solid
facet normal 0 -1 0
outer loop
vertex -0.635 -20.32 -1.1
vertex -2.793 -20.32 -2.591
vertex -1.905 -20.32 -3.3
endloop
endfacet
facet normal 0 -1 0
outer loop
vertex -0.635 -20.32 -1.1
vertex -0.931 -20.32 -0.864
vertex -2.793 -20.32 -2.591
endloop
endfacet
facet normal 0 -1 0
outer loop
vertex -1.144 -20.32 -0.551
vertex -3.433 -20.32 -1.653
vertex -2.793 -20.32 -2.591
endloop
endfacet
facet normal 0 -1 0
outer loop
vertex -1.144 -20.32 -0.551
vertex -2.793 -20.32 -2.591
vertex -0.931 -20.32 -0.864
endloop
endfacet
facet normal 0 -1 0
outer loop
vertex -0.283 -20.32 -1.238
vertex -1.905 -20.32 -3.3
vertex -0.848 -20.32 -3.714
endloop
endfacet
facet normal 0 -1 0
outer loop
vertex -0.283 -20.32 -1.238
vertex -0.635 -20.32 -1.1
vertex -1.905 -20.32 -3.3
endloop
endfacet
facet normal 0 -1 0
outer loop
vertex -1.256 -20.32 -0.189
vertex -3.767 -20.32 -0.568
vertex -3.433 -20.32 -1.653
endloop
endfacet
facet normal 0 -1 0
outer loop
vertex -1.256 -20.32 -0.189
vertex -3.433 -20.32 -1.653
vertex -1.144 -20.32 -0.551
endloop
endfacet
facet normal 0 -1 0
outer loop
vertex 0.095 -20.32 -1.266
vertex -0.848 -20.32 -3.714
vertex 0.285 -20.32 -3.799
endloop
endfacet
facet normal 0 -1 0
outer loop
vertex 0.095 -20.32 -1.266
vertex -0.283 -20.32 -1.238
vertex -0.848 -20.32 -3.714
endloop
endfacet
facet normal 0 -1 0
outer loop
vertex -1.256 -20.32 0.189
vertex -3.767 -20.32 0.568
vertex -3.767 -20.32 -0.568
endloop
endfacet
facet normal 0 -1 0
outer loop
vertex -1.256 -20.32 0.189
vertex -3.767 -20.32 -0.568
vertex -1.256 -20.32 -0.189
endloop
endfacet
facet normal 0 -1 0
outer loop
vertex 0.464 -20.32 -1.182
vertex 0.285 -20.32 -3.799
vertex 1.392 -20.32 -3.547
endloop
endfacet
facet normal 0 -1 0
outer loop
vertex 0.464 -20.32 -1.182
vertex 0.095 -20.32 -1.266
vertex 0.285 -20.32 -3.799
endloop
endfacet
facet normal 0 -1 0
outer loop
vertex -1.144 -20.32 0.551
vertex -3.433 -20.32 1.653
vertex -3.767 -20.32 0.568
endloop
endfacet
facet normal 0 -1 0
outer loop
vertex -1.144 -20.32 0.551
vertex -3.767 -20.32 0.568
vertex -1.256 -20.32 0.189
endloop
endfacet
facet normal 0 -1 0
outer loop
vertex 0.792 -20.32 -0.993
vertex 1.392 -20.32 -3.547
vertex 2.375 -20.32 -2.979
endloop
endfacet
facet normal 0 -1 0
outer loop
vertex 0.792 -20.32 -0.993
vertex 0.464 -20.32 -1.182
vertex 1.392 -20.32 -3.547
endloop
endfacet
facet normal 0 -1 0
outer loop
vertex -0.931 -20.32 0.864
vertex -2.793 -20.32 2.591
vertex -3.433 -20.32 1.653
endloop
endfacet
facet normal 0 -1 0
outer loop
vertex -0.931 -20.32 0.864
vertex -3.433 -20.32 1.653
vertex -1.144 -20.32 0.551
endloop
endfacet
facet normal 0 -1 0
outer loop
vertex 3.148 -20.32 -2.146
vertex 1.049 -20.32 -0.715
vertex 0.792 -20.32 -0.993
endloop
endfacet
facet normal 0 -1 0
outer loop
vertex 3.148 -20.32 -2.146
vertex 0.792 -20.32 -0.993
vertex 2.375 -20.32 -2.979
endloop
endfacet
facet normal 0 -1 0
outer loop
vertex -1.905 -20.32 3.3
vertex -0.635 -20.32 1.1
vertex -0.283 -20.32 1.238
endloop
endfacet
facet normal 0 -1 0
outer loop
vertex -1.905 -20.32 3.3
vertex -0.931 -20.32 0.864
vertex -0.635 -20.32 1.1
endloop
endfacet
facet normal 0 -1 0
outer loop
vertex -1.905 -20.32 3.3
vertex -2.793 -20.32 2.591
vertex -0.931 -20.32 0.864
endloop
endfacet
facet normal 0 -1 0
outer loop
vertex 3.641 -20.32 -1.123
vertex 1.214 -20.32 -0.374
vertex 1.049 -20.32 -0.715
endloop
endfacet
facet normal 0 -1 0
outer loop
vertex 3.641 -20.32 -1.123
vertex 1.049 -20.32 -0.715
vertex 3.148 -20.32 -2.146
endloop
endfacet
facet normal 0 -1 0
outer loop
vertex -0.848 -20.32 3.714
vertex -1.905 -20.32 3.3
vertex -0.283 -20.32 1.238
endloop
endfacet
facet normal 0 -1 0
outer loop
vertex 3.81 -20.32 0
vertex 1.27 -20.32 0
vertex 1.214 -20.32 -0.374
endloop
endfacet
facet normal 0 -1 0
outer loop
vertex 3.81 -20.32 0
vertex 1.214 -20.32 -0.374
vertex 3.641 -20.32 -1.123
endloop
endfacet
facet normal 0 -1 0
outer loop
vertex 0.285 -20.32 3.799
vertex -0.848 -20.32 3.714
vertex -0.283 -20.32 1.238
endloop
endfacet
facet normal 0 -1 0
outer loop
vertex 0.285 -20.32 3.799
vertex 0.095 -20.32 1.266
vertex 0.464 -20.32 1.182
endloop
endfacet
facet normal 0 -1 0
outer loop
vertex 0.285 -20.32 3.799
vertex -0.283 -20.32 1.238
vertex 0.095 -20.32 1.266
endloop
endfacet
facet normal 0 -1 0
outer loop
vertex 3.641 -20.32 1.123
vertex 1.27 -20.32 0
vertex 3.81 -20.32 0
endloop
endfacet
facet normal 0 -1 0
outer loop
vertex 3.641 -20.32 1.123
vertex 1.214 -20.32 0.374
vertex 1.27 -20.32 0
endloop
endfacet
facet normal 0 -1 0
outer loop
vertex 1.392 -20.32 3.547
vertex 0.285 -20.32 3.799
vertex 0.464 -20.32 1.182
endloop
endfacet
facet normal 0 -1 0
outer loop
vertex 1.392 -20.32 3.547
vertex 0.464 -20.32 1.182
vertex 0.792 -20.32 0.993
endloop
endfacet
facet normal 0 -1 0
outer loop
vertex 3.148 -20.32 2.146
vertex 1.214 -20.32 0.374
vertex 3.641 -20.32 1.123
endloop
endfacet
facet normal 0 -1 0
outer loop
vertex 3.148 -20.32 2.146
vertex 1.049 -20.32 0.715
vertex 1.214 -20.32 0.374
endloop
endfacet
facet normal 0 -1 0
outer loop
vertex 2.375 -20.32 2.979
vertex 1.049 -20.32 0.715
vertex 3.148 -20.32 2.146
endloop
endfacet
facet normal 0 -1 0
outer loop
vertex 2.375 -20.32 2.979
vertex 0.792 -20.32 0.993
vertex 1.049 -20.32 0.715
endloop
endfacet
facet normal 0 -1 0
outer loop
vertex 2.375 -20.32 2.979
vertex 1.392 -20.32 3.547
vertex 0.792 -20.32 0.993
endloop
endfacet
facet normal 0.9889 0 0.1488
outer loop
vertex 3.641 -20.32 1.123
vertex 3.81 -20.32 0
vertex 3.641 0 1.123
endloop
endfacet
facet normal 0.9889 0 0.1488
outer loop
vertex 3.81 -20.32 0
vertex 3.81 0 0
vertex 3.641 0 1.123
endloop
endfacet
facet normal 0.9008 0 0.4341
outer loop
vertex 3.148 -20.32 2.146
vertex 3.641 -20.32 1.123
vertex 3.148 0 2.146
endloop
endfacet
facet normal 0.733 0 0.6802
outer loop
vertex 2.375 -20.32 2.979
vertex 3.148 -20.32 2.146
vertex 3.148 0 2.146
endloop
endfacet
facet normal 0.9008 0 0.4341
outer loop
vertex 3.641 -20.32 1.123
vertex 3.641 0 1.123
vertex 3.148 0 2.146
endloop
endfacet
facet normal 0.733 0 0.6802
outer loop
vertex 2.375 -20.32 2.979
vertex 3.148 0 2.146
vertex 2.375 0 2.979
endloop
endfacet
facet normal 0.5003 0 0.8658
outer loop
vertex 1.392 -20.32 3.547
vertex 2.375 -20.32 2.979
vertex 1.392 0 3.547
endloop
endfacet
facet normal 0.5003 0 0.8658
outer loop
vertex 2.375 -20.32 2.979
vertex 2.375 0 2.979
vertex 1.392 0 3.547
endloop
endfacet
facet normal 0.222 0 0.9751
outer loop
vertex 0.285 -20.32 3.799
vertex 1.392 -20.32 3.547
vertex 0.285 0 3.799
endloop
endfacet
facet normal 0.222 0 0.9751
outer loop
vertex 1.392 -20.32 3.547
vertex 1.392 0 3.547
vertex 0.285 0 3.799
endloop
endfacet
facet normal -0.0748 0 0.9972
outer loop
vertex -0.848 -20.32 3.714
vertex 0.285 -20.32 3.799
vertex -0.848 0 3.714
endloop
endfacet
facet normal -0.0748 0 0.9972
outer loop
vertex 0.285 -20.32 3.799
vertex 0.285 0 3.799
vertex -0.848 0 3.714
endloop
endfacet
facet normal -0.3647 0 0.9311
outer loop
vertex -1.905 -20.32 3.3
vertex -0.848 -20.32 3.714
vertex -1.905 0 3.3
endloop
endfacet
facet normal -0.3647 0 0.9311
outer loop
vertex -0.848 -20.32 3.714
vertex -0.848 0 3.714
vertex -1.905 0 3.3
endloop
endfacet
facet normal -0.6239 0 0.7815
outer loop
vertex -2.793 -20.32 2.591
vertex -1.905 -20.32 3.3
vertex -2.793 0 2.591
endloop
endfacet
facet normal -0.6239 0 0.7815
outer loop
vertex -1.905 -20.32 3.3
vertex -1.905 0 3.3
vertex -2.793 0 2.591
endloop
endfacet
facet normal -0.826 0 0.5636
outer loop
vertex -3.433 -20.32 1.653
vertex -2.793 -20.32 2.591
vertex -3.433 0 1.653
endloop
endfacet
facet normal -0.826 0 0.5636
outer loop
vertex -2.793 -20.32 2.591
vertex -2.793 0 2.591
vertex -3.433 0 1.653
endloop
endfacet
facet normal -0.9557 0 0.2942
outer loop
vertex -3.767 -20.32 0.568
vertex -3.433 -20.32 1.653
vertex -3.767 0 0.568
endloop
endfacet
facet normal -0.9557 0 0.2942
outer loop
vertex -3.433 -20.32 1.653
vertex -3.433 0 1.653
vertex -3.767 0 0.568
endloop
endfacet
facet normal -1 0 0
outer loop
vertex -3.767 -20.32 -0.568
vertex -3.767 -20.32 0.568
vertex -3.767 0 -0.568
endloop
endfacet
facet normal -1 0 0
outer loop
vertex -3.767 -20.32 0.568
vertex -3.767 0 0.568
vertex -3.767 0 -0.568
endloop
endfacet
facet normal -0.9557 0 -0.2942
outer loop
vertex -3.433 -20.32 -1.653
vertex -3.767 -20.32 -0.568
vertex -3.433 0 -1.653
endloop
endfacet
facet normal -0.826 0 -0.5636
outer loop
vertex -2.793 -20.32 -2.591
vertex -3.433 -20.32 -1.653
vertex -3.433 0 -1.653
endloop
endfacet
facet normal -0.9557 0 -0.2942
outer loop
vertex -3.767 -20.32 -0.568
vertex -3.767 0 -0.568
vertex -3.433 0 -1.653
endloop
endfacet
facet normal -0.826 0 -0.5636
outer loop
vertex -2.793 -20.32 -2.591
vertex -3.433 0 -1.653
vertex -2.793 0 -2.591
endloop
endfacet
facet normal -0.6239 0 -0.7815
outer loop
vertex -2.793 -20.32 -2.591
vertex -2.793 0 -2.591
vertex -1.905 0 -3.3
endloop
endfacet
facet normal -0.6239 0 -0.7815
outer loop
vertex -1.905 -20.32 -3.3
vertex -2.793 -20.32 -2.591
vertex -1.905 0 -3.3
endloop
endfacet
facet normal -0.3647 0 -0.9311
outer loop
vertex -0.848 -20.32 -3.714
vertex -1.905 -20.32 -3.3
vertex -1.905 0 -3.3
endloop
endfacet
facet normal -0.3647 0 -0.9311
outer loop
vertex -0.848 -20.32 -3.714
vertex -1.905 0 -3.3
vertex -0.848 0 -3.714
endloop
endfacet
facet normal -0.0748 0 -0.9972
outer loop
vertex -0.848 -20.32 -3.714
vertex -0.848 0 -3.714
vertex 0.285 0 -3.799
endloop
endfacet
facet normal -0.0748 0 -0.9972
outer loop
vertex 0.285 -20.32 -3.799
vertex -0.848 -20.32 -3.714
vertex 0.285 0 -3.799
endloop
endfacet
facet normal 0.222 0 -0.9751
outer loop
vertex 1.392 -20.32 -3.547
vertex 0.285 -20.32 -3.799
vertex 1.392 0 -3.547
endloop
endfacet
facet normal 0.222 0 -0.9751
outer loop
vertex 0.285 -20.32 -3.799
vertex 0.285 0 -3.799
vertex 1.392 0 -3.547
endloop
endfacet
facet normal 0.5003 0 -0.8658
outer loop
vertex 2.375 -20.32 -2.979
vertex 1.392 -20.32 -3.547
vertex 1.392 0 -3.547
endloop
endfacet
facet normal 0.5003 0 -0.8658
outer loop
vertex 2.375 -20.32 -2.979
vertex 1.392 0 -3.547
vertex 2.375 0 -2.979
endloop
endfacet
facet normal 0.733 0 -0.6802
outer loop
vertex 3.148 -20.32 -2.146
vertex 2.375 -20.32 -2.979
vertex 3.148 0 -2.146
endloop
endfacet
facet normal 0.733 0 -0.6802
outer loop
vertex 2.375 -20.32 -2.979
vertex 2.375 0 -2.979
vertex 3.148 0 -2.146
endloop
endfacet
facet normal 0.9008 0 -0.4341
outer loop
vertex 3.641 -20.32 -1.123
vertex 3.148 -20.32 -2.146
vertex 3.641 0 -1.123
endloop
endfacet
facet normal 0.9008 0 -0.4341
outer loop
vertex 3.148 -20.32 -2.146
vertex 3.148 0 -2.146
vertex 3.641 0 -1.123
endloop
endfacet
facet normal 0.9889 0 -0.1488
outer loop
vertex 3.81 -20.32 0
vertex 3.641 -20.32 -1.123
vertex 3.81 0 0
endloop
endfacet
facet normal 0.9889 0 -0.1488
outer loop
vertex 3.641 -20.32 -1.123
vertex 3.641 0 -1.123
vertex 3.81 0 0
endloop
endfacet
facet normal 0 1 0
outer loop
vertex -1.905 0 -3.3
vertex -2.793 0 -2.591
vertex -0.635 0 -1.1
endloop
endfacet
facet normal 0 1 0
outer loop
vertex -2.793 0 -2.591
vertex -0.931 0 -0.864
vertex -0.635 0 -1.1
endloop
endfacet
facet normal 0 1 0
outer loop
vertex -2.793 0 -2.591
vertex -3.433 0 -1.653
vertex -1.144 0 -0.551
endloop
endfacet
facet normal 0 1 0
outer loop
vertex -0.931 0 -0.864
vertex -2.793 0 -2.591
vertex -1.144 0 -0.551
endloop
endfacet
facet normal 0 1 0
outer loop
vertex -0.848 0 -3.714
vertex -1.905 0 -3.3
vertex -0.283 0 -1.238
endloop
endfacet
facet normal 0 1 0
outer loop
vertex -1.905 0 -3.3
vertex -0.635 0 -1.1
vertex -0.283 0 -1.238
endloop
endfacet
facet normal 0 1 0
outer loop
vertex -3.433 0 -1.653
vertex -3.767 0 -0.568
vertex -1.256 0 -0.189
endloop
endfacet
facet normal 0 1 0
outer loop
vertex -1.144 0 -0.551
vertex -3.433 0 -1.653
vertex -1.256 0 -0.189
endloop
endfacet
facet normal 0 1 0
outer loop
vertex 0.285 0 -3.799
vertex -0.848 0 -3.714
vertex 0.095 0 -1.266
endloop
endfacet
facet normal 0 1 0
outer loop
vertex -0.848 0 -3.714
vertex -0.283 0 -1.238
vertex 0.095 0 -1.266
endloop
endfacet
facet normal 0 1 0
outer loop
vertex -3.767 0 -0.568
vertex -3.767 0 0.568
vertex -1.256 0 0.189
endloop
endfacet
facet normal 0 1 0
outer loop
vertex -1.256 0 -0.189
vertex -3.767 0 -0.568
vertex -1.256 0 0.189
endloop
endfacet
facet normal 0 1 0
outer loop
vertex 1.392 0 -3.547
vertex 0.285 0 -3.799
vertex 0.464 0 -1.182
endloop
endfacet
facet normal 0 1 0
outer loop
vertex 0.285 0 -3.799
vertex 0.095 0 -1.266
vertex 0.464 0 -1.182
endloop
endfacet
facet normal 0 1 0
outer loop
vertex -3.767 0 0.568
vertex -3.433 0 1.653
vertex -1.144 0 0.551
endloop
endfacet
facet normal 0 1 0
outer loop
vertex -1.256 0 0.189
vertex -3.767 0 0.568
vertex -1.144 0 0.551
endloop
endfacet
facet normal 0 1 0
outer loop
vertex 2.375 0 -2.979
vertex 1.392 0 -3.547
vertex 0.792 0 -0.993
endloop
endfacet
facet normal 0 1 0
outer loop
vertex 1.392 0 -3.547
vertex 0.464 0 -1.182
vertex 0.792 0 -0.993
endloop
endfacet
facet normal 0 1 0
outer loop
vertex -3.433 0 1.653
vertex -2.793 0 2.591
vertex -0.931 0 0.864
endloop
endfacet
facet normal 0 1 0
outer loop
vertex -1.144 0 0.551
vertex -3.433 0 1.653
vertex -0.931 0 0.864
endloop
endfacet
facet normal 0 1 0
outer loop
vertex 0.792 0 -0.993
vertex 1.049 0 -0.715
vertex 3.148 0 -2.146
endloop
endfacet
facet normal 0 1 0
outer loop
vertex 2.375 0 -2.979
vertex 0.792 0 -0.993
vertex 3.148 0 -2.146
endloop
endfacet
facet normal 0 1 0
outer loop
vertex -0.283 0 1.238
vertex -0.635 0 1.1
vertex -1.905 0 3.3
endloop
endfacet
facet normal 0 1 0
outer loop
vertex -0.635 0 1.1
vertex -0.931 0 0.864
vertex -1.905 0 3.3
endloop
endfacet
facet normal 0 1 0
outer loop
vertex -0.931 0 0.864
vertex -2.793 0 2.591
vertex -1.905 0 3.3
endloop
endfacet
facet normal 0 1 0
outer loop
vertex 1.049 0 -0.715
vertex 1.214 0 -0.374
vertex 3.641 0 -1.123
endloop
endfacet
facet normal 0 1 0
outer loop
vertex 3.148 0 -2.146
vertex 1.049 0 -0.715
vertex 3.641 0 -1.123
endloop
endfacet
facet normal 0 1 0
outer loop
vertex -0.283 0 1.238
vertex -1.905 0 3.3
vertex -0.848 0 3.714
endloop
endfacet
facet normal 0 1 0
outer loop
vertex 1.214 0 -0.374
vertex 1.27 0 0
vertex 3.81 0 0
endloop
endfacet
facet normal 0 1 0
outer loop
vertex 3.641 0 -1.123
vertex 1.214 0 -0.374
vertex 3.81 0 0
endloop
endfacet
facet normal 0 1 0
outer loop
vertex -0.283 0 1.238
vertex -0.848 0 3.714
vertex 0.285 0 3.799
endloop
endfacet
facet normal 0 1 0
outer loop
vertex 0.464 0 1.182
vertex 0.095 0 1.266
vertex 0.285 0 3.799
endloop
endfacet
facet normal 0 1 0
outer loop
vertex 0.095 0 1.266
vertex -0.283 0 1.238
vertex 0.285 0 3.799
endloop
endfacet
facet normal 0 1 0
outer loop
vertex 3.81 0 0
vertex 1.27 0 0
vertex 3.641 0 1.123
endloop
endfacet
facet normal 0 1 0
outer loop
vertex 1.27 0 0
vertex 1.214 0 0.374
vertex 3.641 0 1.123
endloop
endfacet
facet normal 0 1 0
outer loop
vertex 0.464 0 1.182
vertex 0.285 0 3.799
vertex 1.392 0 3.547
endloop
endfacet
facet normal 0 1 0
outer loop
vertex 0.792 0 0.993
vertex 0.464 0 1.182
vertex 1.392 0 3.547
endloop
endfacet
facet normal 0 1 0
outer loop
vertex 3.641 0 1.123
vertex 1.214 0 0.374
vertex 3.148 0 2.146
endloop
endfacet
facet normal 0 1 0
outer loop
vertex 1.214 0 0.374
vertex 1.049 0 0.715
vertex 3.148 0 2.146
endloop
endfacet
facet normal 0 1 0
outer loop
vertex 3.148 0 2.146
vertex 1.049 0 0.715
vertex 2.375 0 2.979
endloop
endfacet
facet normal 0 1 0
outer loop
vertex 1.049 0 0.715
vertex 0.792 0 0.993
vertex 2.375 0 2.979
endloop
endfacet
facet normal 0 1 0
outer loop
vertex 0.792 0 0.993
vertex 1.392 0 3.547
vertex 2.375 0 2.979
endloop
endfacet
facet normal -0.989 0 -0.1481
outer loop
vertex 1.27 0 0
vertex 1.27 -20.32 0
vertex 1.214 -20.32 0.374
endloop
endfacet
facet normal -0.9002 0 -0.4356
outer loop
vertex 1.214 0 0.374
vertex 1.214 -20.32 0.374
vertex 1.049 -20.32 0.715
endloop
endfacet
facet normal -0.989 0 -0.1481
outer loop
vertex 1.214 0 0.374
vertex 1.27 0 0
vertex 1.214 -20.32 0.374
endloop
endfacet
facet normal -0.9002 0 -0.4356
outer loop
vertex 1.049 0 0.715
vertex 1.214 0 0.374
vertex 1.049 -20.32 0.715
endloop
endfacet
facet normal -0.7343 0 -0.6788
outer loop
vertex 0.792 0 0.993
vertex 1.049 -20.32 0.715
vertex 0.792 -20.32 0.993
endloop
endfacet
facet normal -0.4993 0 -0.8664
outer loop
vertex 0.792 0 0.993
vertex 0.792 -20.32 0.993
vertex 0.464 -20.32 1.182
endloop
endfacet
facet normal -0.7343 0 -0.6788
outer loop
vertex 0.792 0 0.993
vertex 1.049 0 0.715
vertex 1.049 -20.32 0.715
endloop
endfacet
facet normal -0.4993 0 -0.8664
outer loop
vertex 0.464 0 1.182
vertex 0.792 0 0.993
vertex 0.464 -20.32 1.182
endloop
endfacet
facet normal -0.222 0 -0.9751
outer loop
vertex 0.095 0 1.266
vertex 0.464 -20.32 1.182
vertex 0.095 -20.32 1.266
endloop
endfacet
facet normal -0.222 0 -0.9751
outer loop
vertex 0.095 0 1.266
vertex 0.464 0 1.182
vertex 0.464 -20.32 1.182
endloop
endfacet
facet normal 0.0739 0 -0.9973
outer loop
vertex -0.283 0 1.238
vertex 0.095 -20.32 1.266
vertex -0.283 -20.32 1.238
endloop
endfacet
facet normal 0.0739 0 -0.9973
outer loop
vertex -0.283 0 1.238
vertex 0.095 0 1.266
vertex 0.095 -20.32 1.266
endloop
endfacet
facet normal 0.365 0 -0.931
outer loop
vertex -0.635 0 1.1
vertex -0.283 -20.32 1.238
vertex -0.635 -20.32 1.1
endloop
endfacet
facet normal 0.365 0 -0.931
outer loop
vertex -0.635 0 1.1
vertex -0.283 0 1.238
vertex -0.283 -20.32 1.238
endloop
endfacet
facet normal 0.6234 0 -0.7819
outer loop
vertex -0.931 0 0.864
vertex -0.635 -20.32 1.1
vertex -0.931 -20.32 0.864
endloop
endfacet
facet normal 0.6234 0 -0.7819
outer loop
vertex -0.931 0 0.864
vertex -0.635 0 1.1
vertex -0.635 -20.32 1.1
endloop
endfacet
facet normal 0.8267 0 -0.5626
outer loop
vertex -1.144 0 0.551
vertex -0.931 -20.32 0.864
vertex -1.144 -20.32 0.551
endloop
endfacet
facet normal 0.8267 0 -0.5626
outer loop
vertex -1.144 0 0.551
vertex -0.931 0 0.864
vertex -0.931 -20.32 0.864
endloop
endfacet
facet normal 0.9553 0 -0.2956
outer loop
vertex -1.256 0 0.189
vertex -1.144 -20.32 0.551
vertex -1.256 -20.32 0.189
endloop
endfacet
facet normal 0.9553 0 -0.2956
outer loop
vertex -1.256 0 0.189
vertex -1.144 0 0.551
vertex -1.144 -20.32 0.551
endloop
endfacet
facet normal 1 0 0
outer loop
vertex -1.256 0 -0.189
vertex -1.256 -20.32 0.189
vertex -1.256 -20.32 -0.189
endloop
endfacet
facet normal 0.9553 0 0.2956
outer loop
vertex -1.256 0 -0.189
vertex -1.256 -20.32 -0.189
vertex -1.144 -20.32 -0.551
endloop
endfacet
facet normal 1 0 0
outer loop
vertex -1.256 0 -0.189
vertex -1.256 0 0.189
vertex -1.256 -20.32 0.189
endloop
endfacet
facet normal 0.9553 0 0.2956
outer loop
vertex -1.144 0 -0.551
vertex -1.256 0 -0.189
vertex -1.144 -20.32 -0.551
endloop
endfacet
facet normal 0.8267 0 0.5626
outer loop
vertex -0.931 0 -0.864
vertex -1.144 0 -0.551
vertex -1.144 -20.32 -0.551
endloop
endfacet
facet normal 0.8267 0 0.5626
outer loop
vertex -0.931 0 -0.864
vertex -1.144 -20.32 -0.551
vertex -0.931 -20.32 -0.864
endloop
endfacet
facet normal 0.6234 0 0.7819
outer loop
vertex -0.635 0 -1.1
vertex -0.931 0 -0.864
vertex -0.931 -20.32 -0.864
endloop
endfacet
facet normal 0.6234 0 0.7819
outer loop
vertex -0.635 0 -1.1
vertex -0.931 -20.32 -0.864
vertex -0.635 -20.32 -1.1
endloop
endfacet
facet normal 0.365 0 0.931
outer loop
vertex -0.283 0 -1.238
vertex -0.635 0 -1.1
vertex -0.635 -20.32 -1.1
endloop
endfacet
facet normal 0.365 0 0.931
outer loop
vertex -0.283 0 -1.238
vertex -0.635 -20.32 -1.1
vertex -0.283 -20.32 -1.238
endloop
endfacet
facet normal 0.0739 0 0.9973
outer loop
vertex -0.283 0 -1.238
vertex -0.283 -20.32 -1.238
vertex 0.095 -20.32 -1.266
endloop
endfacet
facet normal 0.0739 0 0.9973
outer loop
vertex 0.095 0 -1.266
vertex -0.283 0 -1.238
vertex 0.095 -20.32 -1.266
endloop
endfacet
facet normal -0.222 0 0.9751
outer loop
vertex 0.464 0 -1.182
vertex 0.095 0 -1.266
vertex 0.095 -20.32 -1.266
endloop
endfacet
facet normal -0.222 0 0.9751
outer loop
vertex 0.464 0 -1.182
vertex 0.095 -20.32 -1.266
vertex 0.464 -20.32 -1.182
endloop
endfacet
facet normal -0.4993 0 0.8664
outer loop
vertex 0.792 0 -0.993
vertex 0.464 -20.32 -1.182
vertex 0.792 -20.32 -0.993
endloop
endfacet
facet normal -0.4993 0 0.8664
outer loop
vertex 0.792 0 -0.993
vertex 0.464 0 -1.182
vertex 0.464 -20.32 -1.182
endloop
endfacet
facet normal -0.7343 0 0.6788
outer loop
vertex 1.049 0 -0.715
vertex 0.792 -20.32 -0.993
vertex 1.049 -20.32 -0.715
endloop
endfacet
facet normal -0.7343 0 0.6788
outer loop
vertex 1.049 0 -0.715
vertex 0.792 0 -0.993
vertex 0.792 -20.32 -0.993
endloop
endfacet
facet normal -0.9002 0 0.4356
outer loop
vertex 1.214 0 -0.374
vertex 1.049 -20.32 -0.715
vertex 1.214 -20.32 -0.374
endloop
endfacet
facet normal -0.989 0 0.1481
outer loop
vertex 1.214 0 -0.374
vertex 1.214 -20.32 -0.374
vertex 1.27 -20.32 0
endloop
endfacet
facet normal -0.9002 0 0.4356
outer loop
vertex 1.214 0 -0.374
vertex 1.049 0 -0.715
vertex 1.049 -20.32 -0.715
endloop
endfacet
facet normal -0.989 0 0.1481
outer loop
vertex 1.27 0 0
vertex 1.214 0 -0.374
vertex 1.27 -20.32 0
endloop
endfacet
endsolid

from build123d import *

# Parameters (mm, degrees)
F0_R     = 3.81
F0_R_2   = 1.27
F1_DEPTH = 19.05
F2_DEPTH = 6.35
F3_DEPTH = 5.08


with BuildPart() as f1:
    # F0 (on Front) → F1 (new body)
    with BuildSketch(Plane.XZ):
        Circle(F0_R)
        Circle(F0_R_2, mode=Mode.SUBTRACT)
    extrude(amount=F1_DEPTH)

    # F2 (add): a face of the model
    f2_faces = [f1.faces().sort_by_distance(p)[0] for p in [
        (-3.7022369265, -19.05, 0),
    ]]
    extrude(f2_faces, amount=F2_DEPTH)

    # F3 (cut): a face of the model
    f3_faces = [f1.faces().sort_by_distance(p)[0] for p in [
        (-3.7022369265, -25.4, 0),
    ]]
    extrude(f3_faces, amount=-F3_DEPTH, mode=Mode.SUBTRACT)


solid = f1.part
